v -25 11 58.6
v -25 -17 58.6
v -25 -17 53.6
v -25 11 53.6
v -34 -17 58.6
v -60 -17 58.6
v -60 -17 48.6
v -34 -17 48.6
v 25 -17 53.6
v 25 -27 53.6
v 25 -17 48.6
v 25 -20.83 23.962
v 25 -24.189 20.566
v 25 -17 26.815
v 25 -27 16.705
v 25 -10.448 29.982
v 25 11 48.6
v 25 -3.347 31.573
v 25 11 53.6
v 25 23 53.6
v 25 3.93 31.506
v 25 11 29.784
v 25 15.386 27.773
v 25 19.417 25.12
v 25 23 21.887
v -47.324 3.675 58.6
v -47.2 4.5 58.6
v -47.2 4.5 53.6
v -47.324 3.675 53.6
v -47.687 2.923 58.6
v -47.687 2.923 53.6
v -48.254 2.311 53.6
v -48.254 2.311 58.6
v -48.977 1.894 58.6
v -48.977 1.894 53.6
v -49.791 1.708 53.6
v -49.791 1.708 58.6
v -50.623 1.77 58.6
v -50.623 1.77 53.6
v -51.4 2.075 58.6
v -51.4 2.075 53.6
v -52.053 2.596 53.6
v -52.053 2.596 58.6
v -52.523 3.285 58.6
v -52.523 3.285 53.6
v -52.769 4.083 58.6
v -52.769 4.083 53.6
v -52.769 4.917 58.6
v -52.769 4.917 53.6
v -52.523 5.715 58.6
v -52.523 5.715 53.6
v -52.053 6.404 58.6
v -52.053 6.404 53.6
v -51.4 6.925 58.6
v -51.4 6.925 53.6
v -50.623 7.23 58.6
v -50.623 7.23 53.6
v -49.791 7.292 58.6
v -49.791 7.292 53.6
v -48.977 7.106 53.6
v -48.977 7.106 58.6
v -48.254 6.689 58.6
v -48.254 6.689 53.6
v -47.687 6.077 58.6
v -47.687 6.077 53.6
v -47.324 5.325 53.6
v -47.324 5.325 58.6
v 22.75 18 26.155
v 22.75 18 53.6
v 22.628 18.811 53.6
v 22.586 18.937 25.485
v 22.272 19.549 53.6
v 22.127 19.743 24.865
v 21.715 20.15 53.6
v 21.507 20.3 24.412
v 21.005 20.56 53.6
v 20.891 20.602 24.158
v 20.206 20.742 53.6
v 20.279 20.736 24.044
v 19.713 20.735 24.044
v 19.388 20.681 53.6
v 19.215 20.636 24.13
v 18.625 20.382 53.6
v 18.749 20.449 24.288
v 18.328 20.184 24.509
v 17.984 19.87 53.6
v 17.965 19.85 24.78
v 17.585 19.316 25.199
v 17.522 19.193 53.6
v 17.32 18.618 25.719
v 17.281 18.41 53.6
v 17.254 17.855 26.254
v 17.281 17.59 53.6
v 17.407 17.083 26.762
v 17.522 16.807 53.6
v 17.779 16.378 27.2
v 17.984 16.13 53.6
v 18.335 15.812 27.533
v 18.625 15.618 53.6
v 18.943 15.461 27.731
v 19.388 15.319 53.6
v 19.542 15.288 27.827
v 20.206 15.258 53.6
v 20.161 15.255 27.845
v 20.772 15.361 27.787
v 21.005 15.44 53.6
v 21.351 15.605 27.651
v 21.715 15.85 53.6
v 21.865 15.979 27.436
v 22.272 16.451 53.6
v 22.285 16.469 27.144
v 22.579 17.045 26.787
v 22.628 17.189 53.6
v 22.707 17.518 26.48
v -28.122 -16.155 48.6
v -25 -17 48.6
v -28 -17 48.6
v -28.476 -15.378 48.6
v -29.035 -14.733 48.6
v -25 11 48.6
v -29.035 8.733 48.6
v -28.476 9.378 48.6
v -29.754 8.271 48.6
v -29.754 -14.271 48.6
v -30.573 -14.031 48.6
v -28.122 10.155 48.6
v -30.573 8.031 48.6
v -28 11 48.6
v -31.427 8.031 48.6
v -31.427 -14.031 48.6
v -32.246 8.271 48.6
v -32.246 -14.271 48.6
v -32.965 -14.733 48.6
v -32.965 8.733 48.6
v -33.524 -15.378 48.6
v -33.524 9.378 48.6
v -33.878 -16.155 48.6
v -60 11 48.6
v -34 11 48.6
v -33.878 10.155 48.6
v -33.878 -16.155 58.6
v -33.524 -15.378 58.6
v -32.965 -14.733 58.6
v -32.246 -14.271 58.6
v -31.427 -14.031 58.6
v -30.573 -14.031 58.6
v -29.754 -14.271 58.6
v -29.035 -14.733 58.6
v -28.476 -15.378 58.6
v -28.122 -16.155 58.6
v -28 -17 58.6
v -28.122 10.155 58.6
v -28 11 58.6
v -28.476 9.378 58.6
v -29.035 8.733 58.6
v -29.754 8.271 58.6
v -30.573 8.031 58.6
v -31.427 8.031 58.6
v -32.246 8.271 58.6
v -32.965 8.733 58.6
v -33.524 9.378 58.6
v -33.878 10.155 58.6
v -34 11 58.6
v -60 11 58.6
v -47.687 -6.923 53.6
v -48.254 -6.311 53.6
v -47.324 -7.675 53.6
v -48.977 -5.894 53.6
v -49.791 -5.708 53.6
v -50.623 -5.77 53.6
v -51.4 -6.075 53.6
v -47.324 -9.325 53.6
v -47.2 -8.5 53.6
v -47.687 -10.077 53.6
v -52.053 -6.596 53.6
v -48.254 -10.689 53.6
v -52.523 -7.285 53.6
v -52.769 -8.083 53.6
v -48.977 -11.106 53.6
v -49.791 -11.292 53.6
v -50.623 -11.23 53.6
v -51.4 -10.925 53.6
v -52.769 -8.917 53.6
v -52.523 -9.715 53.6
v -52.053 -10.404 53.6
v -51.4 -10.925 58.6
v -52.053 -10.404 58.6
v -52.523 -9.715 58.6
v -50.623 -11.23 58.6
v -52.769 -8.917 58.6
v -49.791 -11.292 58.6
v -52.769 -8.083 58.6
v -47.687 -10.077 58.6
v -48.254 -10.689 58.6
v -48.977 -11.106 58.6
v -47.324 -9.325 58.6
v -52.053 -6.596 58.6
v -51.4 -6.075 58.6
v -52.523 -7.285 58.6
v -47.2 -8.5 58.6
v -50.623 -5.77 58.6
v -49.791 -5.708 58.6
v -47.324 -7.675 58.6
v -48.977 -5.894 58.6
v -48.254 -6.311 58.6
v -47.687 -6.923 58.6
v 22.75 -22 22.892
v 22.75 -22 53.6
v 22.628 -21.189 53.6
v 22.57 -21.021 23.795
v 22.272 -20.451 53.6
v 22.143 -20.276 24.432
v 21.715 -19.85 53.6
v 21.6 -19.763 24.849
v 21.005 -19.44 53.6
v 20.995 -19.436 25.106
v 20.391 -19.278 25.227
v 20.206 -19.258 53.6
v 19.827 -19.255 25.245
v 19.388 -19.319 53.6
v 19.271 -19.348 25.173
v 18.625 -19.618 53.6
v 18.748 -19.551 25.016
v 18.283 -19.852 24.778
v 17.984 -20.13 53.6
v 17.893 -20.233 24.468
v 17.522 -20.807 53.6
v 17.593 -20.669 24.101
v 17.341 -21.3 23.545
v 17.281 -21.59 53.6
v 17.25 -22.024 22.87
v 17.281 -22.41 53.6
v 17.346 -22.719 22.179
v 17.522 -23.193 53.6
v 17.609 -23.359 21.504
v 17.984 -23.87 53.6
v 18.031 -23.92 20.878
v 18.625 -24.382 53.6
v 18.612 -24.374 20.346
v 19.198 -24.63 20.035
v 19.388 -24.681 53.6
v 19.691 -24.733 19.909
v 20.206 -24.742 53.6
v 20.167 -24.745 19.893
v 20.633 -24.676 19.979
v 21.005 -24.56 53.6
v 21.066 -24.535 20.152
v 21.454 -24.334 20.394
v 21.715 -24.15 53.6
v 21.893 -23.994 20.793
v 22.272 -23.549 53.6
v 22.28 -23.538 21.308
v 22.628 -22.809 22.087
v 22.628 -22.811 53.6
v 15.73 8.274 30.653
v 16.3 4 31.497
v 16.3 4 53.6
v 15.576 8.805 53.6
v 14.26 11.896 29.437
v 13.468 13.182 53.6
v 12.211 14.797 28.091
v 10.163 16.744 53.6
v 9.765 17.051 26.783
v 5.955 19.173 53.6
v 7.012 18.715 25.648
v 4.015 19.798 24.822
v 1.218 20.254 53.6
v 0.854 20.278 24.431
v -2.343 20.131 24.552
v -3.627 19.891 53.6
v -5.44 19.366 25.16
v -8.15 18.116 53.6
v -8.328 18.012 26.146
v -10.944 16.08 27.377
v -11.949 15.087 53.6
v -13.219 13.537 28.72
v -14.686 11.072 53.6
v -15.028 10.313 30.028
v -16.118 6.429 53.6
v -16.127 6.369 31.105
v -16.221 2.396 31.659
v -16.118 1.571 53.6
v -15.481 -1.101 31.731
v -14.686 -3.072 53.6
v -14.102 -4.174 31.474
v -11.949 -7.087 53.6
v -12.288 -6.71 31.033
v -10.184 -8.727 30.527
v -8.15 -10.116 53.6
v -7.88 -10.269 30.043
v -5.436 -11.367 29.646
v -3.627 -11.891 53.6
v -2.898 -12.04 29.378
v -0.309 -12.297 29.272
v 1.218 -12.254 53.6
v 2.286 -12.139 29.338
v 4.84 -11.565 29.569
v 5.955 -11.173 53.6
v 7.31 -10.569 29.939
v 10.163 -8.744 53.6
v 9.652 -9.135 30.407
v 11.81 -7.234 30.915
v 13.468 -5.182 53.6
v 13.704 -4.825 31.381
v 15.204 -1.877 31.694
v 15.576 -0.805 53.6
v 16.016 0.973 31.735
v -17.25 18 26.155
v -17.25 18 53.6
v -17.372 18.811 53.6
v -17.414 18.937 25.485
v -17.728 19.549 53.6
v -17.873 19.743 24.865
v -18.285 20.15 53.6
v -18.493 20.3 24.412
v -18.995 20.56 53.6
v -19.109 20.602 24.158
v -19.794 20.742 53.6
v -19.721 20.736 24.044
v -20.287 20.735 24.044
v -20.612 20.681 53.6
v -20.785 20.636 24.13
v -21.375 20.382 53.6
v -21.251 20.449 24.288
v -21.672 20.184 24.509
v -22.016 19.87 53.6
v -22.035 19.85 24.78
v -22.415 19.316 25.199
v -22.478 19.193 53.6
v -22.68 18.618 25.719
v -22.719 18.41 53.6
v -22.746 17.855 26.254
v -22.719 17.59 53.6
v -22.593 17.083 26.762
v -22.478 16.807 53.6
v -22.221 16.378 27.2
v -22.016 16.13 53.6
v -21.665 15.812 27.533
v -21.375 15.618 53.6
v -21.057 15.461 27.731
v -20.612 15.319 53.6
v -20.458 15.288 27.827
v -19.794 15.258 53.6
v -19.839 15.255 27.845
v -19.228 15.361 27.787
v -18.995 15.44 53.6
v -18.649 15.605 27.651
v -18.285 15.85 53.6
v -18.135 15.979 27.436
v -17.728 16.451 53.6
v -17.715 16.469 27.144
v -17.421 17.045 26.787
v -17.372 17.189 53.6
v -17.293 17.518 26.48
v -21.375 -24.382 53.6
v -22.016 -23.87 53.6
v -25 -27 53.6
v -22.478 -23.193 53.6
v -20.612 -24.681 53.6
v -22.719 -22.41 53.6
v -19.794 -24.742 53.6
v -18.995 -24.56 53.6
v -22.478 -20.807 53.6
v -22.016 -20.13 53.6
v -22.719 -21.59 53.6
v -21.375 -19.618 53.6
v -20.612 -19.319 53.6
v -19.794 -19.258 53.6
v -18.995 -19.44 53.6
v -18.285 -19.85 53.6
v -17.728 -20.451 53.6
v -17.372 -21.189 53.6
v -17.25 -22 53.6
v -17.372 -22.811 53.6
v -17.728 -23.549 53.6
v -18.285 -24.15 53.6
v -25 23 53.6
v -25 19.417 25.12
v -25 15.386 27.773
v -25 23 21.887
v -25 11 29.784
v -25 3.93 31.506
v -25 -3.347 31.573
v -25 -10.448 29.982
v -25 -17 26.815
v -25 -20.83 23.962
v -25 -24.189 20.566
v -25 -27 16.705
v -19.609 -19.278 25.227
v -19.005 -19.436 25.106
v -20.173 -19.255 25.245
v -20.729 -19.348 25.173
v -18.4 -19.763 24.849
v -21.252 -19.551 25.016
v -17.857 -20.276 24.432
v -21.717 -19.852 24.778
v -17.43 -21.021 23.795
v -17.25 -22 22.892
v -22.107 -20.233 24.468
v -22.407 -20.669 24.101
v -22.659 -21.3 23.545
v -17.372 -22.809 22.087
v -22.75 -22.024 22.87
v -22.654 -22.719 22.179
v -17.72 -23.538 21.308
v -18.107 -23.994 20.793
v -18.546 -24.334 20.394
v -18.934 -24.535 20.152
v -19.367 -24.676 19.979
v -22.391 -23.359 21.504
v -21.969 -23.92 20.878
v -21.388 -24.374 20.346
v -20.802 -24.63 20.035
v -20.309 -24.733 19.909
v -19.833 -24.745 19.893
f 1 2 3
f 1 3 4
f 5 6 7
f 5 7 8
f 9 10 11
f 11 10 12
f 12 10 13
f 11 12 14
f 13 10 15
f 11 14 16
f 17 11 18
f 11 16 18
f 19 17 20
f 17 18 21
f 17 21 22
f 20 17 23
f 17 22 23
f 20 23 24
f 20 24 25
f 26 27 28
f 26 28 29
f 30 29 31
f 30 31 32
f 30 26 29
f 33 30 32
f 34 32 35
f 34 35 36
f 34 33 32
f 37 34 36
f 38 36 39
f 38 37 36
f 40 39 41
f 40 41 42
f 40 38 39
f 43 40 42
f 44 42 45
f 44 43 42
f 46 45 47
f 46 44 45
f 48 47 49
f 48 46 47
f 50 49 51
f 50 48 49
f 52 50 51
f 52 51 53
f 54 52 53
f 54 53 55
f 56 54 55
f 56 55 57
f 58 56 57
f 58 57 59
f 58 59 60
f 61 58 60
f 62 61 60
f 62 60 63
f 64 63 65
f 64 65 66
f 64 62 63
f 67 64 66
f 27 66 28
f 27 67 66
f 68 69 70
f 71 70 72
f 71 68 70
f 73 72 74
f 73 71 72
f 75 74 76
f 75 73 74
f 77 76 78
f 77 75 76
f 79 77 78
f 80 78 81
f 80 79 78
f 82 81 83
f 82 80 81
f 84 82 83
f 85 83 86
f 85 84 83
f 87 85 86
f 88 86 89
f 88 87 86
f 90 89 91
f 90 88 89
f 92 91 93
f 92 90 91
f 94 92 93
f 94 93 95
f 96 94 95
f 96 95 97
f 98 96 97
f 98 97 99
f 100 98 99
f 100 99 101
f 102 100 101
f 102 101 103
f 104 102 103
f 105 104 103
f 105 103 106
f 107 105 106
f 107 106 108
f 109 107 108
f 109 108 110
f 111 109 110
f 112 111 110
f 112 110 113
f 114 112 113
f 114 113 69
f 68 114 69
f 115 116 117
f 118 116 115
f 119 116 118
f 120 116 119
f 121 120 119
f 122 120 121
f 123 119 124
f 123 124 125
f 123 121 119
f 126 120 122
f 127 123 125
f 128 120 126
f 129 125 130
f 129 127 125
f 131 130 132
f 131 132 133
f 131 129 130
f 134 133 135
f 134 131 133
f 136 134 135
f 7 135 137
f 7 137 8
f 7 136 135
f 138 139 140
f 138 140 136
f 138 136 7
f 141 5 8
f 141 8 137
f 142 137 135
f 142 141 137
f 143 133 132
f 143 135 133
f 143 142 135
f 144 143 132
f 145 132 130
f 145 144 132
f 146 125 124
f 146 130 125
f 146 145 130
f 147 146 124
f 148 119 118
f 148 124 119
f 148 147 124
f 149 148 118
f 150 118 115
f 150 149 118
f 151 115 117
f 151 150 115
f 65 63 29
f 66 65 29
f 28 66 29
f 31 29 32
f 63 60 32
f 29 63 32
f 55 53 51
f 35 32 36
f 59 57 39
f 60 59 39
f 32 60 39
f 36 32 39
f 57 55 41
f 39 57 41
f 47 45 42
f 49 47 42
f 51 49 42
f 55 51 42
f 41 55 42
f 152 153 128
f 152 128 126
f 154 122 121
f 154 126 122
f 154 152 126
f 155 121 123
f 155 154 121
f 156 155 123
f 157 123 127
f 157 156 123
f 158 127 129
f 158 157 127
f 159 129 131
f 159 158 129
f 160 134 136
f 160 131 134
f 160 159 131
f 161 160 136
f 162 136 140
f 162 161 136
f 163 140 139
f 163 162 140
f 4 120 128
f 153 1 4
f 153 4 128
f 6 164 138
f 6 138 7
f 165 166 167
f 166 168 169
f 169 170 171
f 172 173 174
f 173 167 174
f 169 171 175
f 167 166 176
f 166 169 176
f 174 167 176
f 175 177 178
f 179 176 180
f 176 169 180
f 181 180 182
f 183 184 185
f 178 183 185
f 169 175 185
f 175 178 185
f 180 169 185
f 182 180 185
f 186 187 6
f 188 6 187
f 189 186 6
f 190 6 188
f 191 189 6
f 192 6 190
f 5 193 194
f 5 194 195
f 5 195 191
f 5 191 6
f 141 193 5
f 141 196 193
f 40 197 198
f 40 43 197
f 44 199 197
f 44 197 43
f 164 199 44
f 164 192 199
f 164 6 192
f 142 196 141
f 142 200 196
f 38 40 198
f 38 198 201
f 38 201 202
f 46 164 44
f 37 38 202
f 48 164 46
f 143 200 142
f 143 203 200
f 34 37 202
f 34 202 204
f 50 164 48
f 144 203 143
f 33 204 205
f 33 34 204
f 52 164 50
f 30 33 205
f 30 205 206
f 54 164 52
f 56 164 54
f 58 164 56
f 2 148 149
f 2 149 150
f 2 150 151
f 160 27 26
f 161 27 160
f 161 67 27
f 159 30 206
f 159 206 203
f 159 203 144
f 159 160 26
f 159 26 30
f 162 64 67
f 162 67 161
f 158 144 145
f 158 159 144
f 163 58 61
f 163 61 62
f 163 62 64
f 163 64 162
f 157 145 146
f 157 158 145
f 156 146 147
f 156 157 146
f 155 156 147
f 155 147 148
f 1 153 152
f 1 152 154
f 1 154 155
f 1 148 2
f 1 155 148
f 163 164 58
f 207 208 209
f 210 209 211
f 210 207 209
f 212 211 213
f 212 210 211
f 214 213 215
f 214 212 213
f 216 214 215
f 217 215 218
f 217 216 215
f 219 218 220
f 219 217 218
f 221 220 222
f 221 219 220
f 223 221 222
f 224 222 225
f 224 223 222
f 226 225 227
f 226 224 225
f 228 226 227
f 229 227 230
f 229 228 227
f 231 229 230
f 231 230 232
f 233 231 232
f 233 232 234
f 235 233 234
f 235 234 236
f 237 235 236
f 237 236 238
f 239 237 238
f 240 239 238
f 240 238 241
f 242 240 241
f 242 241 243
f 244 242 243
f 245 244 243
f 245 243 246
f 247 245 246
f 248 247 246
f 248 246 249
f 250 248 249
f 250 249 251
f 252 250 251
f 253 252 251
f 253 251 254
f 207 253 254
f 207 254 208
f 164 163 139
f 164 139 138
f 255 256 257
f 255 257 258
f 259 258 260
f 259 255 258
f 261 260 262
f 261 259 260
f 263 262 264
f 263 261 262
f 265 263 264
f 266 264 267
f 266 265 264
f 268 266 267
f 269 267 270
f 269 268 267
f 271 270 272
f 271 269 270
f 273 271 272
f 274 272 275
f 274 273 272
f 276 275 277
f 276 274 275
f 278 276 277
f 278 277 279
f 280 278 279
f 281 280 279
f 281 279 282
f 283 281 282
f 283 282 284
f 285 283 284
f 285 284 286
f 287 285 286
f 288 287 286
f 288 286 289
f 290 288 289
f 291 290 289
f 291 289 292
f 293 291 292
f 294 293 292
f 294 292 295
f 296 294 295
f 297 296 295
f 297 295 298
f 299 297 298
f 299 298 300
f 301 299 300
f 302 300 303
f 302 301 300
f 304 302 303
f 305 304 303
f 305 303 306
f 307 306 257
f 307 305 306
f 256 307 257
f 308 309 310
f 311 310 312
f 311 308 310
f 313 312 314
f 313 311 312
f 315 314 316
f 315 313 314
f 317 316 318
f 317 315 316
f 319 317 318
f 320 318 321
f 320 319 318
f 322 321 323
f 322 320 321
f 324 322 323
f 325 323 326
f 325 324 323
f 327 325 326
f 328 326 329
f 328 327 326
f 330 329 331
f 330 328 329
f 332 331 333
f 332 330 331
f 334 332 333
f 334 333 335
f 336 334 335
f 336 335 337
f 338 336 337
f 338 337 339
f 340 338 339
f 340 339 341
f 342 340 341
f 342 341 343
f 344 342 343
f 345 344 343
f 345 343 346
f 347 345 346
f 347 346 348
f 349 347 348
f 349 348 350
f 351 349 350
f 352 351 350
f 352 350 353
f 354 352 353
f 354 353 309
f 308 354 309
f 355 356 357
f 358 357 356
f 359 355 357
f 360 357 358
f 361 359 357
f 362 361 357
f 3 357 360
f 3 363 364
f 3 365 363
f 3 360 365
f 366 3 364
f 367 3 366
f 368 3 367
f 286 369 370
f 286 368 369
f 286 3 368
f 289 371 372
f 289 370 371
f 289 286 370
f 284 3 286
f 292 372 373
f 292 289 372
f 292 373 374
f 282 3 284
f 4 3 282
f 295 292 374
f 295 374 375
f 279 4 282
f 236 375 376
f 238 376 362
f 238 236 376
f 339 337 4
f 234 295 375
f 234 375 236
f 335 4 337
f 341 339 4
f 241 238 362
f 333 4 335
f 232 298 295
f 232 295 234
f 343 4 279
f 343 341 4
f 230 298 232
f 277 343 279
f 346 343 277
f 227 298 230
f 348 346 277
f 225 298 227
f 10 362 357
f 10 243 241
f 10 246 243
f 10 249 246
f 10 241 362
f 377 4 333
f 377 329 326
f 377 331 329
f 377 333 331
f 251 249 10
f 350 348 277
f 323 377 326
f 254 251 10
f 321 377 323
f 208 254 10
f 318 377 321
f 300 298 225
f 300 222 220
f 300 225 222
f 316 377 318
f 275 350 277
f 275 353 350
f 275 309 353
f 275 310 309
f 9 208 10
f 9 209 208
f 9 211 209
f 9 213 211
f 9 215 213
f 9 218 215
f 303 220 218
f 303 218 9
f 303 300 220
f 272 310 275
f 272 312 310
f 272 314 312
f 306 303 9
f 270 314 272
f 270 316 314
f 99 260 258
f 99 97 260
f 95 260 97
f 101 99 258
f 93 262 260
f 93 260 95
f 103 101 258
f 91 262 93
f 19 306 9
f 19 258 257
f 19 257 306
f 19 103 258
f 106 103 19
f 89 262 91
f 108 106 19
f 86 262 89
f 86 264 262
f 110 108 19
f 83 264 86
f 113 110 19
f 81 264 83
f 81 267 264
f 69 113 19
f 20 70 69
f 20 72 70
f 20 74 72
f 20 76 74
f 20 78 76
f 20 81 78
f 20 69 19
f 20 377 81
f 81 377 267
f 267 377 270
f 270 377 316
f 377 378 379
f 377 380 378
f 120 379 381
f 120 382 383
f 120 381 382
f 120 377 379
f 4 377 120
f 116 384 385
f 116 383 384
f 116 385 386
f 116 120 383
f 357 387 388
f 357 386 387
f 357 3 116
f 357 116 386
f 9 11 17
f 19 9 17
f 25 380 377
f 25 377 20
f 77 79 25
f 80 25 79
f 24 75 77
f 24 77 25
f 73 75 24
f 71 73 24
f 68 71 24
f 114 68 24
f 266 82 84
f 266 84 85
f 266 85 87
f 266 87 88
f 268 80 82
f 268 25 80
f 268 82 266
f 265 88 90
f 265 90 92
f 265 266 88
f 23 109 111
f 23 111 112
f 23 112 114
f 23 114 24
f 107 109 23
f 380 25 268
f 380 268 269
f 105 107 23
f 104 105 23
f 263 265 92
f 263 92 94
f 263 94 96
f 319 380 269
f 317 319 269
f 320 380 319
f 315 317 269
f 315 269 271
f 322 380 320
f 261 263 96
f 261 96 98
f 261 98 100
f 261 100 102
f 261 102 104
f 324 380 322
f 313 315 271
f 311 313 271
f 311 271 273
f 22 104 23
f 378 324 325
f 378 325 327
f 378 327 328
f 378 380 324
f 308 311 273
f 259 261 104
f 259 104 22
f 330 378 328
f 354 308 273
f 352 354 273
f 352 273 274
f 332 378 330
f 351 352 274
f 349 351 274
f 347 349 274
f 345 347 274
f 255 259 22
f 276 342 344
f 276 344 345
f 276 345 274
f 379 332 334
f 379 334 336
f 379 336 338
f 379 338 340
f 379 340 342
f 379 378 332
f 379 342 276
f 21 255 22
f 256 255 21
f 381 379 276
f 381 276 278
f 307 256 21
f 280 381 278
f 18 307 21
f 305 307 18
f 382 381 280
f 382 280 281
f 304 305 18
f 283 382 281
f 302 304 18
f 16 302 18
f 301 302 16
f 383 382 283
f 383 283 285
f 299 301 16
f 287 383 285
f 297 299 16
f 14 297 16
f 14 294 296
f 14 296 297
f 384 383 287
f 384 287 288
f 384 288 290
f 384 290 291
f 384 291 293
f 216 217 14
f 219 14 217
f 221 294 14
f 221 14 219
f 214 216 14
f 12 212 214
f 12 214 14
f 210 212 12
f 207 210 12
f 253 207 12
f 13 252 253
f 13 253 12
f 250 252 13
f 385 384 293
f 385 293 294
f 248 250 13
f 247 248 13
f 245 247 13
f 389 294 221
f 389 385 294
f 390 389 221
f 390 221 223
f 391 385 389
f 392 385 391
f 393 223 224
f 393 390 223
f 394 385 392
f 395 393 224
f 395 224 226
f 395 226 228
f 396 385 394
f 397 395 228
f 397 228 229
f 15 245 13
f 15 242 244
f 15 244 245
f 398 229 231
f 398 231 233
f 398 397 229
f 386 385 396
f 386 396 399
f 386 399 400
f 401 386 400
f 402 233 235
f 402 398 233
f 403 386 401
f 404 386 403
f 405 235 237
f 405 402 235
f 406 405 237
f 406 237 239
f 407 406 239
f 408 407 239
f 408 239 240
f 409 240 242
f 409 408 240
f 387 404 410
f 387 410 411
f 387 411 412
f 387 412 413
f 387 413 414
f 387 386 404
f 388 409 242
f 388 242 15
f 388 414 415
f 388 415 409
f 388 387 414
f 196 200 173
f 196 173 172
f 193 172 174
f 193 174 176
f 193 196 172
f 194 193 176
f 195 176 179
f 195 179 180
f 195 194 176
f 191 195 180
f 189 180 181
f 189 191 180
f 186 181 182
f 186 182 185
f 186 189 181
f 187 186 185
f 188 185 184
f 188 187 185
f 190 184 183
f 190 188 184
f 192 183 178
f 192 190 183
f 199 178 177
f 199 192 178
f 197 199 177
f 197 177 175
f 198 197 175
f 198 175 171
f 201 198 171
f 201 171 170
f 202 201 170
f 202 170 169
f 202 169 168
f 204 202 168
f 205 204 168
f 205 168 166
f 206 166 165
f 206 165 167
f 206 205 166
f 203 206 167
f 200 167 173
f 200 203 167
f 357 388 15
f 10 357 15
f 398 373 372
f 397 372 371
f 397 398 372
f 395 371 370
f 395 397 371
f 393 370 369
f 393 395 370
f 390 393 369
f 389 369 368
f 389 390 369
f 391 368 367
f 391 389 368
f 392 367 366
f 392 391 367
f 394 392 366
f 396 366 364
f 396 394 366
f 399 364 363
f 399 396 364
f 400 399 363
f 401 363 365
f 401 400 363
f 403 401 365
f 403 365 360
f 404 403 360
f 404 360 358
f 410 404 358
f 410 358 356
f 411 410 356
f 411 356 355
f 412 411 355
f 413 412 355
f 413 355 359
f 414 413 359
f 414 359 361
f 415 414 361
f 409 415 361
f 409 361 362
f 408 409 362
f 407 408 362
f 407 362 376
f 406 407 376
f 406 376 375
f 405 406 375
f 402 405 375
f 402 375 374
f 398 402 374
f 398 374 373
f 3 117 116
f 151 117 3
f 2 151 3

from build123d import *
from build123d.topology import SkipClean

# Parameters (mm, degrees)
SKETCH1_W               = 50
SKETCH1_H               = 50
SKETCH1_R               = 2.75
SKETCH1_R_2             = 16.3
BOSS_EXTRUDE1_DEPTH     = 53.6
CUT_EXTRUDE1_DEPTH      = 66.015075175
CUT_EXTRUDE1_DEPTH_BACK = 66.015075175
SKETCH2_R               = 31.75
BOSS_EXTRUDE3_START     = 35
BOSS_EXTRUDE3_DEPTH     = 35
SKETCH9_R               = 3
CUT_EXTRUDE5_DEPTH      = 85.864362462
CUT_EXTRUDE6_DEPTH      = 76.433606288
CUT_EXTRUDE6_DEPTH_BACK = 10
SKETCH10_R              = 2.8
CUT_EXTRUDE8_START      = -5
CUT_EXTRUDE8_DEPTH      = 71.433606288
BOSS_EXTRUDE4_START     = 5
SKETCH13_3_R            = 2.8
BOSS_EXTRUDE4_DEPTH     = 5
CUT_EXTRUDE9_DEPTH      = 5
CUT_EXTRUDE9_DEPTH_BACK = 5
SKETCH13_4_R            = 2.8


with BuildPart() as part:
    # Sketch1 → Boss-Extrude1 (new body)
    with BuildSketch(Plane.XY):
        with Locations((0, -2)):
            Rectangle(SKETCH1_W, SKETCH1_H)
        with Locations((-20, 18)):
            Circle(SKETCH1_R, mode=Mode.SUBTRACT)
        with Locations((20, 18)):
            Circle(SKETCH1_R, mode=Mode.SUBTRACT)
        with Locations((20, -22)):
            Circle(SKETCH1_R, mode=Mode.SUBTRACT)
        with Locations((-20, -22)):
            Circle(SKETCH1_R, mode=Mode.SUBTRACT)
        with Locations((0, 4)):
            Circle(SKETCH1_R_2, mode=Mode.SUBTRACT)
    extrude(amount=BOSS_EXTRUDE1_DEPTH)

    # Sketch2 → Cut-Extrude1 (cut, two sides: drawn at the far end of the back side and taken through both)
    with BuildSketch(Plane(origin=(0, 0, 0), x_dir=(0, 0, -1), z_dir=(1, 0, 0)).offset(-CUT_EXTRUDE1_DEPTH_BACK)):
        Circle(SKETCH2_R)
    extrude(amount=CUT_EXTRUDE1_DEPTH + CUT_EXTRUDE1_DEPTH_BACK, mode=Mode.SUBTRACT)

    # Sketch4 → Boss-Extrude3 (add)
    with SkipClean():  # the faces are left unmerged after this step: merging them gives an invalid solid
        with BuildSketch(Plane(origin=(25, 0, 0), x_dir=(0, 0, -1), z_dir=(1, 0, 0)).offset(BOSS_EXTRUDE3_START)):
            with BuildLine():
                Line((-53.6, 11), (-53.6, -17))
                Line((-53.6, -17), (-26.815340759, -17))
                ThreePointArc((-26.815340759, -17), (-31.573087709, -3.347033393), (-29.783594477, 11))
                Line((-29.783594477, 11), (-53.6, 11))
            make_face()
        boss_extrude3 = extrude(amount=-BOSS_EXTRUDE3_DEPTH)

    # Sketch9 → Cut-Extrude5 (cut, symmetric)
    with SkipClean():  # the faces are left unmerged after this step: merging them gives an invalid solid
        with BuildSketch(Plane.XY):
            with Locations((31, 11)):
                Circle(SKETCH9_R)
            with Locations((31, -17)):
                Circle(SKETCH9_R)
        cut_extrude5 = extrude(amount=CUT_EXTRUDE5_DEPTH, both=True, mode=Mode.SUBTRACT)

    # Sketch10 → Cut-Extrude6 (cut, two sides: drawn at the far end of the back side and taken through both)
    with SkipClean():  # the faces are left unmerged after this step: merging them gives an invalid solid
        with BuildSketch(Plane.XY.offset(53.6).offset(-CUT_EXTRUDE6_DEPTH_BACK)):
            with Locations((50, 4.5)):
                Circle(SKETCH10_R)
            with Locations((50, -8.5)):
                Circle(SKETCH10_R)
        extrude(amount=CUT_EXTRUDE6_DEPTH + CUT_EXTRUDE6_DEPTH_BACK, mode=Mode.SUBTRACT)

    # Sketch13 → Cut-Extrude8 (cut, through all)
    with BuildSketch(Plane.XY.offset(53.6).offset(CUT_EXTRUDE8_START)):
        with BuildLine():
            Line((60, -17), (60, 11))
            Line((60, 11), (34, 11))
            ThreePointArc((34, 11), (31, 8), (28, 11))
            Line((28, 11), (25, 11))
            Line((25, 11), (25, -17))
            Line((25, -17), (28, -17))
            ThreePointArc((28, -17), (31, -14), (34, -17))
            Line((34, -17), (60, -17))
        make_face()
    cut_extrude8 = extrude(amount=-CUT_EXTRUDE8_DEPTH, mode=Mode.SUBTRACT)

    # Sketch13<3> → Boss-Extrude4 (add)
    with SkipClean():  # the faces are left unmerged after this step: merging them gives an invalid solid
        with BuildSketch(Plane.XY.offset(53.6).offset(BOSS_EXTRUDE4_START)):
            with BuildLine():
                Line((60, 11), (60, -17))
                Line((60, -17), (34, -17))
                ThreePointArc((34, -17), (31, -14), (28, -17))
                Line((28, -17), (25, -17))
                Line((25, -17), (25, 11))
                Line((25, 11), (28, 11))
                ThreePointArc((28, 11), (31, 8), (34, 11))
                Line((34, 11), (60, 11))
            make_face()
            with Locations((50, 4.5)):
                Circle(SKETCH13_3_R, mode=Mode.SUBTRACT)
            with Locations((50, -8.5)):
                Circle(SKETCH13_3_R, mode=Mode.SUBTRACT)
        boss_extrude4 = extrude(amount=-BOSS_EXTRUDE4_DEPTH)
    add(part.part.scale(1), mode=Mode.REPLACE)  # the faces are merged on a copy

    # Mirror3: Boss-Extrude3, Cut-Extrude5, Cut-Extrude8, Boss-Extrude4 across plane
    with SkipClean():  # the faces are left unmerged after this step: merging them gives an invalid solid
        add(boss_extrude3.mirror(Plane(origin=(0, 0, 0), x_dir=(0, 0, 1), z_dir=(1, 0, 0))))
        add(cut_extrude5.mirror(Plane(origin=(0, 0, 0), x_dir=(0, 0, 1), z_dir=(1, 0, 0))), mode=Mode.SUBTRACT)
        add(cut_extrude8.mirror(Plane(origin=(0, 0, 0), x_dir=(0, 0, 1), z_dir=(1, 0, 0))), mode=Mode.SUBTRACT)
        add(boss_extrude4.mirror(Plane(origin=(0, 0, 0), x_dir=(0, 0, 1), z_dir=(1, 0, 0))))
    add(part.part.scale(1), mode=Mode.REPLACE)  # the faces are merged on a copy

    # Sketch13<4> → Cut-Extrude9 (cut, two sides: drawn at the far end of the back side and taken through both)
    with SkipClean():  # the faces are left unmerged after this step: merging them gives an invalid solid
        with BuildSketch(Plane.XY.offset(53.6).offset(-CUT_EXTRUDE9_DEPTH_BACK)):
            with BuildLine():
                Line((60, 11), (60, -17))
                Line((60, -17), (34, -17))
                ThreePointArc((34, -17), (31, -14), (28, -17))
                Line((28, -17), (25, -17))
                Line((25, -17), (25, 11))
                Line((25, 11), (28, 11))
                ThreePointArc((28, 11), (31, 8), (34, 11))
                Line((34, 11), (60, 11))
            make_face()
            with Locations((50, 4.5)):
                Circle(SKETCH13_4_R, mode=Mode.SUBTRACT)
            with Locations((50, -8.5)):
                Circle(SKETCH13_4_R, mode=Mode.SUBTRACT)
        extrude(amount=CUT_EXTRUDE9_DEPTH + CUT_EXTRUDE9_DEPTH_BACK, mode=Mode.SUBTRACT)


solid = part.part
